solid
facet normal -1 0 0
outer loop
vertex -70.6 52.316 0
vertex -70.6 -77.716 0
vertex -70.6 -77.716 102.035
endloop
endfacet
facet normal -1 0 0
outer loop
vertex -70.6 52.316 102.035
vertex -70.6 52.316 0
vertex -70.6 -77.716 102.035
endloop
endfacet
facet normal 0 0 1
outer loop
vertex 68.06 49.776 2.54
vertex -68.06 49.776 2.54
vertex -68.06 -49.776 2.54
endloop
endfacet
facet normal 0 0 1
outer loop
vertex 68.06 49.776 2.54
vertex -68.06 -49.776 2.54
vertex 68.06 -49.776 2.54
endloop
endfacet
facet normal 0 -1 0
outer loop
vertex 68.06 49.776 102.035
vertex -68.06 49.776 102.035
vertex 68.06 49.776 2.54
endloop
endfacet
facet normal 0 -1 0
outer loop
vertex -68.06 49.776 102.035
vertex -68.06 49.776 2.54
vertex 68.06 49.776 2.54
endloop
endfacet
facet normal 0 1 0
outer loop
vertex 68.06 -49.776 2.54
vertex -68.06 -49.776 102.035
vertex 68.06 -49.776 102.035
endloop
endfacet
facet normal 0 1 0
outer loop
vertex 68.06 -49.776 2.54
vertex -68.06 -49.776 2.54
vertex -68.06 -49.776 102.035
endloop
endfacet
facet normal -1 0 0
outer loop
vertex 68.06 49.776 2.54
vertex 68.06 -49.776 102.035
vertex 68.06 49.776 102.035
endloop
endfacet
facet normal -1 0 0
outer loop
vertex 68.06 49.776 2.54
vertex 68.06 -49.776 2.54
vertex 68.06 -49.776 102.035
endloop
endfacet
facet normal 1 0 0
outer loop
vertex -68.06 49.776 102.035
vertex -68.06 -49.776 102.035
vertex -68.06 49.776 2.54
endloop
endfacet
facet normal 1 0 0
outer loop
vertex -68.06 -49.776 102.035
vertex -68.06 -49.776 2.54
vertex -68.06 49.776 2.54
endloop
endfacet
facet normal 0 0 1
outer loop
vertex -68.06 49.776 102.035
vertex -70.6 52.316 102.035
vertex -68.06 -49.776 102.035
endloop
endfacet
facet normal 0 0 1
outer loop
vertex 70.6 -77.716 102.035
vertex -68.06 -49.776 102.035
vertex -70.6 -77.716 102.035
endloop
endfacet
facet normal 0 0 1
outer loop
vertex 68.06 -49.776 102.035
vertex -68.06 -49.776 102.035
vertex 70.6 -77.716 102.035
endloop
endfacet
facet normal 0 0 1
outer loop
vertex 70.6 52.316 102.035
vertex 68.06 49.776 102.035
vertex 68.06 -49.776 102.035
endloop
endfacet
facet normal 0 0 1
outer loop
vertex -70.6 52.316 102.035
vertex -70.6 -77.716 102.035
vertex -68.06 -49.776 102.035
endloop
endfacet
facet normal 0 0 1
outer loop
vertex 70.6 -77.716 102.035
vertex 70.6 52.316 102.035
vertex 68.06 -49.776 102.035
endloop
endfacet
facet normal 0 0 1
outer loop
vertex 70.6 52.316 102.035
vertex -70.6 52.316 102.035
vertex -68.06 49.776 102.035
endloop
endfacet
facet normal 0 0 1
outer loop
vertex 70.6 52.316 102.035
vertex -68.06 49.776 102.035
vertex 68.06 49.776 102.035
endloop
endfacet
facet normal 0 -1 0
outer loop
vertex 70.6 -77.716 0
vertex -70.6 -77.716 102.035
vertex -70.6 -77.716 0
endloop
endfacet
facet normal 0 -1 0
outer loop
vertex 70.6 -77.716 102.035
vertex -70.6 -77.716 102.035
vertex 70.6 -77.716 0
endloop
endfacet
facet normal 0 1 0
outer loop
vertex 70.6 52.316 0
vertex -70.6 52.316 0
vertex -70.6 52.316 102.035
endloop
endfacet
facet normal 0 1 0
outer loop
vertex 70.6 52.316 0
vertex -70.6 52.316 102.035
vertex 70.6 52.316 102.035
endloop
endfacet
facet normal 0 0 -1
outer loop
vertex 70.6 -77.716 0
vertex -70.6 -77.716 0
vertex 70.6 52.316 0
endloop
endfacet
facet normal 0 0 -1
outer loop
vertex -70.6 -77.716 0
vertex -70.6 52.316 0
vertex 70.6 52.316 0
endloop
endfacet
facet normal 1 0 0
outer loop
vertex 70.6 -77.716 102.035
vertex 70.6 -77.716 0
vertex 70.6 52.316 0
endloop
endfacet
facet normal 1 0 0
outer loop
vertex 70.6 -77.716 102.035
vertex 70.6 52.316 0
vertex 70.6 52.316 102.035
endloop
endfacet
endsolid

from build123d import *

# Parameters (mm, degrees)
F1_W      = 141.20084
F1_H      = 104.631812
F2_DEPTH  = 102.034964
F3_T      = -2.54
F2_FACE_W = 141.20084
F2_FACE_H = 102.034964
F4_DEPTH  = 25.4


with BuildPart() as f2:
    # F1 (on face) → F2 (new body)
    with BuildSketch(Plane.XY):
        Rectangle(F1_W, F1_H)
    extrude(amount=F2_DEPTH)

    # F3
    f3_openings = [f2.faces().sort_by_distance(p)[0] for p in [
        (0, 0, 102.034964),
    ]]
    offset(amount=F3_T, openings=f3_openings)

    # F2_face (on face) → F4 (join)
    with BuildSketch(Plane(origin=(0, -52.315906, 51.017482), x_dir=(1, 0, 0), z_dir=(0, -1, 0))):
        Rectangle(F2_FACE_W, F2_FACE_H)
    extrude(amount=F4_DEPTH)


solid = f2.part
